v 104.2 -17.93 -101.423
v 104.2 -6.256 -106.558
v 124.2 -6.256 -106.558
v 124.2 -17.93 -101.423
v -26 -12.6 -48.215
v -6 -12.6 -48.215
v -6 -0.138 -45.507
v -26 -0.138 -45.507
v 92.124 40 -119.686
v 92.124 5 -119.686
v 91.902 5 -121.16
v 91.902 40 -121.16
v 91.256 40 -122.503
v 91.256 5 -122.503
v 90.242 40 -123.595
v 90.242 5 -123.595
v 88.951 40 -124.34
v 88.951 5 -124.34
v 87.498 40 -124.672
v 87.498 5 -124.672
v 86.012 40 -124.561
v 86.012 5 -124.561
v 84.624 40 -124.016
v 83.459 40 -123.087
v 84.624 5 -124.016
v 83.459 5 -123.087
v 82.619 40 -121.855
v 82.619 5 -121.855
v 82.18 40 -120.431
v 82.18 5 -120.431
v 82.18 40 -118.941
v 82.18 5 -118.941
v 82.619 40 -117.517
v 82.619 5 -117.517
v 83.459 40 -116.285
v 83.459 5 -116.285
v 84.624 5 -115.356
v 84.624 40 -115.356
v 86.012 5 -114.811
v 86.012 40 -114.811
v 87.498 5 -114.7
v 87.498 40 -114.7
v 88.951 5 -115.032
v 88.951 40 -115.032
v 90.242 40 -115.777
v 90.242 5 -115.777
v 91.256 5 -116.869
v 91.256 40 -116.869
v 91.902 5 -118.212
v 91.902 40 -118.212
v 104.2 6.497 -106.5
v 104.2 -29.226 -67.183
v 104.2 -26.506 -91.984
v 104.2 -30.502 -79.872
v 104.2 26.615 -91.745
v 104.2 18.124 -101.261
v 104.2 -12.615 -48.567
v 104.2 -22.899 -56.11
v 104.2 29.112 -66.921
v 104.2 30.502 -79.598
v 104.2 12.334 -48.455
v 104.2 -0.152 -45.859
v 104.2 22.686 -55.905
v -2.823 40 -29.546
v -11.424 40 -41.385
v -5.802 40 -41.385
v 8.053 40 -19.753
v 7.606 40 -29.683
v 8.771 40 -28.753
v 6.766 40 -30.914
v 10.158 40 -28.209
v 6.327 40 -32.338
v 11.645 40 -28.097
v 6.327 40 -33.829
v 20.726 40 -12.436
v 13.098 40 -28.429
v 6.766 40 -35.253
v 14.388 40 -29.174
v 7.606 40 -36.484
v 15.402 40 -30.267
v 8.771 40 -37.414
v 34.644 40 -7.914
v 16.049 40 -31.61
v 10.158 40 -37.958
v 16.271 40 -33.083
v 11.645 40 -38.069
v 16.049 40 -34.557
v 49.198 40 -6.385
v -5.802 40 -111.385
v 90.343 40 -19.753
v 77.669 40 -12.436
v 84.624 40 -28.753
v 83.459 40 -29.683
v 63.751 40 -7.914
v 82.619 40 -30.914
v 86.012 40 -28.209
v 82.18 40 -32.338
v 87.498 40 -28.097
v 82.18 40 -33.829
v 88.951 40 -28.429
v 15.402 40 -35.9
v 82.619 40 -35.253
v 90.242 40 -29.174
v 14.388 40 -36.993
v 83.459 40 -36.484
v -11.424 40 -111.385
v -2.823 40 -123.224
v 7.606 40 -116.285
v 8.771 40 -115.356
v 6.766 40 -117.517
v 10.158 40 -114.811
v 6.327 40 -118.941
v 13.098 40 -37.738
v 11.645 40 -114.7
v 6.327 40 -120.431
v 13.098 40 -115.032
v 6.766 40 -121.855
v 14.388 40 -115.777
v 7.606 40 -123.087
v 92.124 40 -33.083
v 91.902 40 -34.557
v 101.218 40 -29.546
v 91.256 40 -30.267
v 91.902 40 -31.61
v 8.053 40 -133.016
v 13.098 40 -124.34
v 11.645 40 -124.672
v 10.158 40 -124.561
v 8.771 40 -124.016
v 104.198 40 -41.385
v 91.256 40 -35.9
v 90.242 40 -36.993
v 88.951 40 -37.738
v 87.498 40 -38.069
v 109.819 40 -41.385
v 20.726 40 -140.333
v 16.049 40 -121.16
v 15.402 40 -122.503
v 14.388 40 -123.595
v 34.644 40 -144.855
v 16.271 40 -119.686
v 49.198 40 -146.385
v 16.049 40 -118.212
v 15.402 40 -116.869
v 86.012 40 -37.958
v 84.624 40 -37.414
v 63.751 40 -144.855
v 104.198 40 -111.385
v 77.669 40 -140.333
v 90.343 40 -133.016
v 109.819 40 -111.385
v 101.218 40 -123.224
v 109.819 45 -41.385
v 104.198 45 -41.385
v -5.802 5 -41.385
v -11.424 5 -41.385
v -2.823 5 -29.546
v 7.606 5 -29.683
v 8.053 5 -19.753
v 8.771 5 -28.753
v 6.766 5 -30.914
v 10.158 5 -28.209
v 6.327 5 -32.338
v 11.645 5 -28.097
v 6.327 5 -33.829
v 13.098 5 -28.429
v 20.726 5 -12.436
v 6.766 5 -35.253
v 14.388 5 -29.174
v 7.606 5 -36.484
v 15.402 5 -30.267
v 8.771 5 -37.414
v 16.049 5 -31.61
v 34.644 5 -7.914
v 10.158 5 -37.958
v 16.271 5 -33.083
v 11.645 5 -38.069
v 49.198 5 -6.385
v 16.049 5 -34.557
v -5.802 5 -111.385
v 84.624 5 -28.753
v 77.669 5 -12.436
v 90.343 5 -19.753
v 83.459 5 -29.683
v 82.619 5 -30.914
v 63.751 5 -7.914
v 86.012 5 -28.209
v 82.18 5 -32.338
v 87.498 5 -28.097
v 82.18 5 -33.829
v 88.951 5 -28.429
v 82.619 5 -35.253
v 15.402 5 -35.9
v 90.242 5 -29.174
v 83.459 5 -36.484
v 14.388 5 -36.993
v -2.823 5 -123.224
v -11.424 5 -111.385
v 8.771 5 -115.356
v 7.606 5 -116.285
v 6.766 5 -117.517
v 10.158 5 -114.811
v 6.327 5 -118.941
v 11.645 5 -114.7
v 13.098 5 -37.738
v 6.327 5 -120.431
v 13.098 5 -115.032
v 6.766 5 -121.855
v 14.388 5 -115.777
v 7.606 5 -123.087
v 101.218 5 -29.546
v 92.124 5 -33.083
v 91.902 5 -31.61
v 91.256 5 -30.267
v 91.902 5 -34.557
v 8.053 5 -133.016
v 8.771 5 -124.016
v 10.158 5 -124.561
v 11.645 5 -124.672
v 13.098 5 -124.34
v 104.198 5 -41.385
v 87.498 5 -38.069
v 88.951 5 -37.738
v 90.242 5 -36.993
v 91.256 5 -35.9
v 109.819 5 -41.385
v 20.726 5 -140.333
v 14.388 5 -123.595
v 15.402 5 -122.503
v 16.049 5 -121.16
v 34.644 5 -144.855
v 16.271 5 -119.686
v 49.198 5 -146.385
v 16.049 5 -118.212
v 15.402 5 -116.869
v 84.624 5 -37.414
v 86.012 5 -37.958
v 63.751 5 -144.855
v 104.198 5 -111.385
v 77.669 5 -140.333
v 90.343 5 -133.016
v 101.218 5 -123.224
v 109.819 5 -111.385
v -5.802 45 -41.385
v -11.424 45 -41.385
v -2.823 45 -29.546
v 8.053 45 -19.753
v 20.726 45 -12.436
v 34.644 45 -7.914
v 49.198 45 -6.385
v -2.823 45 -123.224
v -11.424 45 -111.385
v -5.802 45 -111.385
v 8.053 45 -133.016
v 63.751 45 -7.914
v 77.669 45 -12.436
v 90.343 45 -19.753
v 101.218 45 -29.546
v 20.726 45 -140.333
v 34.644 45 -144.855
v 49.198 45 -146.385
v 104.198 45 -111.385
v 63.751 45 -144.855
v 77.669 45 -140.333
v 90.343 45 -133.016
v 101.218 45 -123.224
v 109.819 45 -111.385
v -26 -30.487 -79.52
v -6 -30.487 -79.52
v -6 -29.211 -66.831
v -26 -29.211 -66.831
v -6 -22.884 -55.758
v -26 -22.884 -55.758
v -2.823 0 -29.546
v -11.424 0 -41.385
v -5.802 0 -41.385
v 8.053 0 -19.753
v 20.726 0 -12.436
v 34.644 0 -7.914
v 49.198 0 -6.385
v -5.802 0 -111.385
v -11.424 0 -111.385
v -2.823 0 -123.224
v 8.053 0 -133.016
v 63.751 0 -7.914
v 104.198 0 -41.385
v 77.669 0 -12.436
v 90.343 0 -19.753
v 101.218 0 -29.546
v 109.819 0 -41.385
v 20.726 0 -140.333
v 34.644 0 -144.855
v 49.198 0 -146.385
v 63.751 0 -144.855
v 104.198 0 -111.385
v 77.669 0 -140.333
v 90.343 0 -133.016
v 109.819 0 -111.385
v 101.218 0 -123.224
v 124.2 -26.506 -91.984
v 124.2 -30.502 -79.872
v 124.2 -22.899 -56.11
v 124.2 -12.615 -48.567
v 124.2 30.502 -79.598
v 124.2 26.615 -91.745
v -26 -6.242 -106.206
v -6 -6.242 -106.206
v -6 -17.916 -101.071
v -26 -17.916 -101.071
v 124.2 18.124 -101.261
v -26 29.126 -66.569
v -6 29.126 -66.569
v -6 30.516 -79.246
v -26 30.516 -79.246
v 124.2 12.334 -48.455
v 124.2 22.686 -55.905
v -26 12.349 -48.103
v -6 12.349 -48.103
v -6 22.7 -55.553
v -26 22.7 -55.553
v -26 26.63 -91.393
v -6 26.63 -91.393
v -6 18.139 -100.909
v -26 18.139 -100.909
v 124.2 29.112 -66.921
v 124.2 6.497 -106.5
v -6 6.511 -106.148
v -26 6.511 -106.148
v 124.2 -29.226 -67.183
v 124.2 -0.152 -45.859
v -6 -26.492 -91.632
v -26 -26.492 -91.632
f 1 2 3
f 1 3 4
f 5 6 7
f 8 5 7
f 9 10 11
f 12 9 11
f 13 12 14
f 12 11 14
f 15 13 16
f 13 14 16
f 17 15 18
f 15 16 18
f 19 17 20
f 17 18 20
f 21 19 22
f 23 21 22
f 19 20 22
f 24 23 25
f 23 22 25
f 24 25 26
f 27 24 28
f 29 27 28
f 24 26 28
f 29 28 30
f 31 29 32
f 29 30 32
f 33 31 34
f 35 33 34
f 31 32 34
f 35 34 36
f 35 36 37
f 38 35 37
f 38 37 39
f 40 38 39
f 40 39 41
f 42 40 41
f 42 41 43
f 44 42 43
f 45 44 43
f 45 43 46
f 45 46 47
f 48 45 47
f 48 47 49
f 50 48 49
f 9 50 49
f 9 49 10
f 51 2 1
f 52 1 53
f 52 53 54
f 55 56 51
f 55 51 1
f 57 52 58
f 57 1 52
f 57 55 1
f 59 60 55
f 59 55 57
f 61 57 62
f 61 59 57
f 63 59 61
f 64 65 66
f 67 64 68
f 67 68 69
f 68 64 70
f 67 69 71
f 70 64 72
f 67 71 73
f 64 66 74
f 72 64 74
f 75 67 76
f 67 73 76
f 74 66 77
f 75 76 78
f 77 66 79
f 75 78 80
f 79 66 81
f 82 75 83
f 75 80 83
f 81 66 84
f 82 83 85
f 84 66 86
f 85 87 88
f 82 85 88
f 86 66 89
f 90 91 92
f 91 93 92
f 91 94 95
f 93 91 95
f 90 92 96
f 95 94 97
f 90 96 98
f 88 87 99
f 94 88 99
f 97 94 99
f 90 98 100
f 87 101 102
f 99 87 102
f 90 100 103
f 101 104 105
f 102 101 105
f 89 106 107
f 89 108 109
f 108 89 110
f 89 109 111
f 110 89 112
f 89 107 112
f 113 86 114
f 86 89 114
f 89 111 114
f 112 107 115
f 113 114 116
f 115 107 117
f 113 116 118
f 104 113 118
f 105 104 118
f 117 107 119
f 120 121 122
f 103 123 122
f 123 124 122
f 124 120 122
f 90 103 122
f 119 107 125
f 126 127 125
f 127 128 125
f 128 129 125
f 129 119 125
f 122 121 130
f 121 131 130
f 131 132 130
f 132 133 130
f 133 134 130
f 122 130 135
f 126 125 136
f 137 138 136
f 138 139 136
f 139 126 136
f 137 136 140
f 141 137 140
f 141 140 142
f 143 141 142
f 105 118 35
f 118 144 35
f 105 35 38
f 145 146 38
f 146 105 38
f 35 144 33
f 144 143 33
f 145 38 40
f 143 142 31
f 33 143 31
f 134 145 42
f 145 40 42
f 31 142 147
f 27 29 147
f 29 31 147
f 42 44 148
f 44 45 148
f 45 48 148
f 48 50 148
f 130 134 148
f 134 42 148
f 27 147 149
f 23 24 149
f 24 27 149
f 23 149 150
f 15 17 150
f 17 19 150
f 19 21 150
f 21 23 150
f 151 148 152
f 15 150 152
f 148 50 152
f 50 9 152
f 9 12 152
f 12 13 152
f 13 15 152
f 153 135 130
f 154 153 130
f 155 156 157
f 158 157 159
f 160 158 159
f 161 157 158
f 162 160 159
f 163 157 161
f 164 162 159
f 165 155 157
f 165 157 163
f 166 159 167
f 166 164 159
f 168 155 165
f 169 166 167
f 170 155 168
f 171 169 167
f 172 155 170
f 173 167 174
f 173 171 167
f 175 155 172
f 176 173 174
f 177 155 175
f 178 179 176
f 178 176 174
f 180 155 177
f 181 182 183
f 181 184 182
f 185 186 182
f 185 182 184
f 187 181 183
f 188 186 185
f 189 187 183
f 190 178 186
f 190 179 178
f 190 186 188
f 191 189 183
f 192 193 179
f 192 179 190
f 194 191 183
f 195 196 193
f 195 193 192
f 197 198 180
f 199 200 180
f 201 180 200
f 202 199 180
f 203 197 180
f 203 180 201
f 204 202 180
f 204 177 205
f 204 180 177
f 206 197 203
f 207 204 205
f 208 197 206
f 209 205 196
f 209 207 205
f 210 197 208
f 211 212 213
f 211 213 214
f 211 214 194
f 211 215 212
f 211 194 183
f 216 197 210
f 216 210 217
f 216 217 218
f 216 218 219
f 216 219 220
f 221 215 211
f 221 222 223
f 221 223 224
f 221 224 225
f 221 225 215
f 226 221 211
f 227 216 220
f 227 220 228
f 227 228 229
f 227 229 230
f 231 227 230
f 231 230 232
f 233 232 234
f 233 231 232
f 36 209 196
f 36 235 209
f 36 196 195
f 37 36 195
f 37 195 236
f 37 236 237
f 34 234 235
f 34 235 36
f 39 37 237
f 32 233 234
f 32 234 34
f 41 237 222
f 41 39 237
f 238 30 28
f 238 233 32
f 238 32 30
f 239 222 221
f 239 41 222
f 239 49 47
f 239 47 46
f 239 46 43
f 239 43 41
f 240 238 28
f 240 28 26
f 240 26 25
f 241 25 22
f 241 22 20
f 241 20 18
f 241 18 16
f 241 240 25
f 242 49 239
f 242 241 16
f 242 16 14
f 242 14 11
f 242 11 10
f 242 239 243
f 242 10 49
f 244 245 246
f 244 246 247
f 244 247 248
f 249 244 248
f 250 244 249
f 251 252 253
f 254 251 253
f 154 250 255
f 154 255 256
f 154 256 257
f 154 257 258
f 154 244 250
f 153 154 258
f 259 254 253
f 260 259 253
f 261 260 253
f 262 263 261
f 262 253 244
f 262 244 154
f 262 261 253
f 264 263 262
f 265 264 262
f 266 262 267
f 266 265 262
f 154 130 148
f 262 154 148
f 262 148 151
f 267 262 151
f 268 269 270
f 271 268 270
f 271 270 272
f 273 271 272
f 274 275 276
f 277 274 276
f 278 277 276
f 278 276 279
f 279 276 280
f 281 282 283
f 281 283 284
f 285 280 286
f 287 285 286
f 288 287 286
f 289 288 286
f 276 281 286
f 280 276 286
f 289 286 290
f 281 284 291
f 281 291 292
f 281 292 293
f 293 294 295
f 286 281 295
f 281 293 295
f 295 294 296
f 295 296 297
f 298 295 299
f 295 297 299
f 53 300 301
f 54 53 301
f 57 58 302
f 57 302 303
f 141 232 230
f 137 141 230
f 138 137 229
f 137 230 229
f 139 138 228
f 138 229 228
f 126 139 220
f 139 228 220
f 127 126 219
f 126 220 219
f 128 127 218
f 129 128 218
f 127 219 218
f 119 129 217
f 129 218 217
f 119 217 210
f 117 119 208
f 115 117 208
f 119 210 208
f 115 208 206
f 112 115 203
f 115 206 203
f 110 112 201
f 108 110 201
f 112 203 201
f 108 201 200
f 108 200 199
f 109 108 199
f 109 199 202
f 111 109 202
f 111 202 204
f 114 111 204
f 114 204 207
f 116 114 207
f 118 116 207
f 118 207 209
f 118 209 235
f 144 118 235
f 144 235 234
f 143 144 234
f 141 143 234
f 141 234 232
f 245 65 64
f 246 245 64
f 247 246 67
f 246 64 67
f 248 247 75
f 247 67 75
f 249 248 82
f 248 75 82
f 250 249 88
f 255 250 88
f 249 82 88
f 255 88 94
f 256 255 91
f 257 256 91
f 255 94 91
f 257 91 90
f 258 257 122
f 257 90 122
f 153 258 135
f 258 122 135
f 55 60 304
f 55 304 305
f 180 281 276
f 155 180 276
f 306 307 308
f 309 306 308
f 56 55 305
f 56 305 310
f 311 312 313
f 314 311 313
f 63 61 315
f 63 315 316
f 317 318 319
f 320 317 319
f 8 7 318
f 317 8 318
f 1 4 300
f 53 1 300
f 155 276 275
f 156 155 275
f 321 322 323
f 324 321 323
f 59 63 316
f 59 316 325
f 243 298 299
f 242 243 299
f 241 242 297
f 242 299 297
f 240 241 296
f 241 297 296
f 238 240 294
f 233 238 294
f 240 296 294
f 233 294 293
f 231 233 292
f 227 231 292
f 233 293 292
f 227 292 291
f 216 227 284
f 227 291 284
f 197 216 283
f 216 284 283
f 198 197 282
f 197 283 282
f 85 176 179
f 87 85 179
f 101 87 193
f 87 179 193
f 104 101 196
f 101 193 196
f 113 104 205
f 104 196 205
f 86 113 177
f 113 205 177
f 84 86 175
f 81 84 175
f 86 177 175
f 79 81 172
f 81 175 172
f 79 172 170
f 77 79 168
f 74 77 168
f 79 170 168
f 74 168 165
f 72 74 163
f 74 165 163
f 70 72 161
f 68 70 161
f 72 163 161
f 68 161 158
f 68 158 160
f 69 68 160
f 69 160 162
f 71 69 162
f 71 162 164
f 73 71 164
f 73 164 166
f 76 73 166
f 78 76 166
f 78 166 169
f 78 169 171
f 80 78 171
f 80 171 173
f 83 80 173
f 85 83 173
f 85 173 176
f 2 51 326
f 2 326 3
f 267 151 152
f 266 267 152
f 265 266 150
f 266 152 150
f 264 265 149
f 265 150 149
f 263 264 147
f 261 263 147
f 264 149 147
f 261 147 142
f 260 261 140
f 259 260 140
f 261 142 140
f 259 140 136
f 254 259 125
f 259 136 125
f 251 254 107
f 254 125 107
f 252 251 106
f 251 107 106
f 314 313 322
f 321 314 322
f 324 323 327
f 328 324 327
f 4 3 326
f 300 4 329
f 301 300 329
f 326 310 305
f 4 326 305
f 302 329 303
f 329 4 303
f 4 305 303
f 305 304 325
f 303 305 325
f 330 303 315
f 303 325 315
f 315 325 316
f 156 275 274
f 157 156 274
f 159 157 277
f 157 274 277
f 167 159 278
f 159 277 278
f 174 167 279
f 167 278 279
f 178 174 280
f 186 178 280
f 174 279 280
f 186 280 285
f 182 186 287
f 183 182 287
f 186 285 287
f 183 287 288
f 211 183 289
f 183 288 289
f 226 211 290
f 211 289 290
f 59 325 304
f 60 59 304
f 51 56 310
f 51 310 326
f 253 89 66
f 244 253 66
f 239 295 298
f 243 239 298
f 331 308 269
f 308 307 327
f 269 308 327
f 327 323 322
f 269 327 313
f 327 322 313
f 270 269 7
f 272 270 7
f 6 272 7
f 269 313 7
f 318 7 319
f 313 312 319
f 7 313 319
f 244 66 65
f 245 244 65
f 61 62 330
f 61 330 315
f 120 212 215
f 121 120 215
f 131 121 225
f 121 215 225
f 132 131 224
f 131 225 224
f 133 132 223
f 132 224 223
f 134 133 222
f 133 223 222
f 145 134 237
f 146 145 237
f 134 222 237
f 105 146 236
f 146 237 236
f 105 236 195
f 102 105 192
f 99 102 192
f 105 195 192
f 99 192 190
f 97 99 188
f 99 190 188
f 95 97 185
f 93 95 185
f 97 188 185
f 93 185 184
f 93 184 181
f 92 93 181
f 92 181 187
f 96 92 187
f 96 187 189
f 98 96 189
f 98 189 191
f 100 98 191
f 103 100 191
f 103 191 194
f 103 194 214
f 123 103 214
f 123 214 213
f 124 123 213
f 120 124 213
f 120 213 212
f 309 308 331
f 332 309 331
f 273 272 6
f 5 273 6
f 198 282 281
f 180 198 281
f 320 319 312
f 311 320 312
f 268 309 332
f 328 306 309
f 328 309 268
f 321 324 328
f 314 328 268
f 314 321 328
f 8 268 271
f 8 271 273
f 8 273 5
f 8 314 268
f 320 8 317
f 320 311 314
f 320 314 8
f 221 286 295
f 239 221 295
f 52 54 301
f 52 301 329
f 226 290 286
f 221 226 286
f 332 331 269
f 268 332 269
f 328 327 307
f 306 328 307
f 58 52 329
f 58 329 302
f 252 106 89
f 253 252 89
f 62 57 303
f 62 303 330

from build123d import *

# Parameters (mm, degrees)
BOSS_EXTRUDE2_DEPTH = 5
SKETCH7_R           = 5
BOSS_EXTRUDE3_DEPTH = 40
BOSS_EXTRUDE5_DEPTH = 5
BOSS_EXTRUDE7_DEPTH = 20
BOSS_EXTRUDE8_DEPTH = 20


with BuildPart() as part:
    # Sketch2 → Boss-Extrude2 (new body)
    with BuildSketch(Plane(origin=(0, 0, 0), x_dir=(1, 0, 0), z_dir=(0, 1, 0))):
        with BuildLine():
            ThreePointArc((-11.424183933, 41.384676223), (49.197594332, 6.384676223), (109.819372597, 41.384676223))
            Line((109.819372597, 41.384676223), (104.197594332, 41.384676223))
            Line((104.197594332, 41.384676223), (104.197594332, 111.384676223))
            Line((104.197594332, 111.384676223), (109.819372597, 111.384676223))
            ThreePointArc((109.819372597, 111.384676223), (49.197594332, 146.384676223), (-11.424183933, 111.384676223))
            Line((-11.424183933, 111.384676223), (-5.802405668, 111.384676223))
            Line((-5.802405668, 111.384676223), (-5.802405668, 41.384676223))
            Line((-5.802405668, 41.384676223), (-11.424183933, 41.384676223))
        make_face()
    extrude(amount=BOSS_EXTRUDE2_DEPTH)

    # Sketch7 → Boss-Extrude3 (add)
    with BuildSketch(Plane(origin=(0, 0, 0), x_dir=(1, 0, 0), z_dir=(0, 1, 0))):
        with Locations((11.270866676, 119.685946413)):
            Circle(SKETCH7_R)
        with Locations((87.124321988, 119.685946413)):
            Circle(SKETCH7_R)
        with Locations((87.124321988, 33.083406034)):
            Circle(SKETCH7_R)
        with Locations((11.270866676, 33.083406034)):
            Circle(SKETCH7_R)
    extrude(amount=BOSS_EXTRUDE3_DEPTH)

    # Sketch12 → Boss-Extrude5 (add)
    with BuildSketch(Plane(origin=(0, 40, 0), x_dir=(1, 0, 0), z_dir=(0, 1, 0))):
        with BuildLine():
            Line((109.819372597, 41.384676223), (104.197594332, 41.384676223))
            Line((104.197594332, 41.384676223), (104.197594332, 111.384676223))
            Line((104.197594332, 111.384676223), (109.819372597, 111.384676223))
            ThreePointArc((109.819372597, 111.384676223), (49.197594332, 146.384676223), (-11.424183933, 111.384676223))
            Line((-11.424183933, 111.384676223), (-5.802405668, 111.384676223))
            Line((-5.802405668, 111.384676223), (-5.802405668, 41.384676223))
            Line((-5.802405668, 41.384676223), (-11.424183933, 41.384676223))
            ThreePointArc((-11.424183933, 41.384676223), (49.197594332, 6.384676223), (109.819372597, 41.384676223))
        make_face()
    extrude(amount=BOSS_EXTRUDE5_DEPTH)


with BuildPart() as body_2:
    # Sketch15 → Boss-Extrude7 (new body)
    with BuildSketch(Plane.ZY.offset(6)):
        Polygon((-48.215080274, -12.60049092), (-45.507466236, -0.137831609), (-48.102957942, 12.348660039), (-55.552771297, 22.699956182), (-66.568765893, 29.126223679), (-79.246176186, 30.516302498), (-91.392962767, 26.629835384), (-100.908835886, 18.138827807), (-106.14841463, 6.511452116), (-106.205728236, -6.2418128), (-101.07086666, -17.915811578), (-91.631694118, -26.492003774), (-79.520329293, -30.487487845), (-66.830937194, -29.211408298), (-55.757628992, -22.884410879), align=None)
    extrude(amount=BOSS_EXTRUDE7_DEPTH)


with BuildPart() as body_3:
    # Sketch18 → Boss-Extrude8 (new body)
    with BuildSketch(Plane.ZY.offset(-104.2)):
        Polygon((-48.567110562, -12.614898246), (-45.859496523, -0.152238936), (-48.454988229, 12.334252712), (-55.904801584, 22.685548856), (-66.92079618, 29.111816352), (-79.598206473, 30.501895172), (-91.744993054, 26.615428057), (-101.260866173, 18.124420481), (-106.500444917, 6.49704479), (-106.557758523, -6.256220126), (-101.422896947, -17.930218904), (-91.983724405, -26.5064111), (-79.87235958, -30.501895172), (-67.182967481, -29.225815624), (-56.109659279, -22.898818205), align=None)
    extrude(amount=-BOSS_EXTRUDE8_DEPTH)


solid = Compound([part.part, body_2.part, body_3.part])
